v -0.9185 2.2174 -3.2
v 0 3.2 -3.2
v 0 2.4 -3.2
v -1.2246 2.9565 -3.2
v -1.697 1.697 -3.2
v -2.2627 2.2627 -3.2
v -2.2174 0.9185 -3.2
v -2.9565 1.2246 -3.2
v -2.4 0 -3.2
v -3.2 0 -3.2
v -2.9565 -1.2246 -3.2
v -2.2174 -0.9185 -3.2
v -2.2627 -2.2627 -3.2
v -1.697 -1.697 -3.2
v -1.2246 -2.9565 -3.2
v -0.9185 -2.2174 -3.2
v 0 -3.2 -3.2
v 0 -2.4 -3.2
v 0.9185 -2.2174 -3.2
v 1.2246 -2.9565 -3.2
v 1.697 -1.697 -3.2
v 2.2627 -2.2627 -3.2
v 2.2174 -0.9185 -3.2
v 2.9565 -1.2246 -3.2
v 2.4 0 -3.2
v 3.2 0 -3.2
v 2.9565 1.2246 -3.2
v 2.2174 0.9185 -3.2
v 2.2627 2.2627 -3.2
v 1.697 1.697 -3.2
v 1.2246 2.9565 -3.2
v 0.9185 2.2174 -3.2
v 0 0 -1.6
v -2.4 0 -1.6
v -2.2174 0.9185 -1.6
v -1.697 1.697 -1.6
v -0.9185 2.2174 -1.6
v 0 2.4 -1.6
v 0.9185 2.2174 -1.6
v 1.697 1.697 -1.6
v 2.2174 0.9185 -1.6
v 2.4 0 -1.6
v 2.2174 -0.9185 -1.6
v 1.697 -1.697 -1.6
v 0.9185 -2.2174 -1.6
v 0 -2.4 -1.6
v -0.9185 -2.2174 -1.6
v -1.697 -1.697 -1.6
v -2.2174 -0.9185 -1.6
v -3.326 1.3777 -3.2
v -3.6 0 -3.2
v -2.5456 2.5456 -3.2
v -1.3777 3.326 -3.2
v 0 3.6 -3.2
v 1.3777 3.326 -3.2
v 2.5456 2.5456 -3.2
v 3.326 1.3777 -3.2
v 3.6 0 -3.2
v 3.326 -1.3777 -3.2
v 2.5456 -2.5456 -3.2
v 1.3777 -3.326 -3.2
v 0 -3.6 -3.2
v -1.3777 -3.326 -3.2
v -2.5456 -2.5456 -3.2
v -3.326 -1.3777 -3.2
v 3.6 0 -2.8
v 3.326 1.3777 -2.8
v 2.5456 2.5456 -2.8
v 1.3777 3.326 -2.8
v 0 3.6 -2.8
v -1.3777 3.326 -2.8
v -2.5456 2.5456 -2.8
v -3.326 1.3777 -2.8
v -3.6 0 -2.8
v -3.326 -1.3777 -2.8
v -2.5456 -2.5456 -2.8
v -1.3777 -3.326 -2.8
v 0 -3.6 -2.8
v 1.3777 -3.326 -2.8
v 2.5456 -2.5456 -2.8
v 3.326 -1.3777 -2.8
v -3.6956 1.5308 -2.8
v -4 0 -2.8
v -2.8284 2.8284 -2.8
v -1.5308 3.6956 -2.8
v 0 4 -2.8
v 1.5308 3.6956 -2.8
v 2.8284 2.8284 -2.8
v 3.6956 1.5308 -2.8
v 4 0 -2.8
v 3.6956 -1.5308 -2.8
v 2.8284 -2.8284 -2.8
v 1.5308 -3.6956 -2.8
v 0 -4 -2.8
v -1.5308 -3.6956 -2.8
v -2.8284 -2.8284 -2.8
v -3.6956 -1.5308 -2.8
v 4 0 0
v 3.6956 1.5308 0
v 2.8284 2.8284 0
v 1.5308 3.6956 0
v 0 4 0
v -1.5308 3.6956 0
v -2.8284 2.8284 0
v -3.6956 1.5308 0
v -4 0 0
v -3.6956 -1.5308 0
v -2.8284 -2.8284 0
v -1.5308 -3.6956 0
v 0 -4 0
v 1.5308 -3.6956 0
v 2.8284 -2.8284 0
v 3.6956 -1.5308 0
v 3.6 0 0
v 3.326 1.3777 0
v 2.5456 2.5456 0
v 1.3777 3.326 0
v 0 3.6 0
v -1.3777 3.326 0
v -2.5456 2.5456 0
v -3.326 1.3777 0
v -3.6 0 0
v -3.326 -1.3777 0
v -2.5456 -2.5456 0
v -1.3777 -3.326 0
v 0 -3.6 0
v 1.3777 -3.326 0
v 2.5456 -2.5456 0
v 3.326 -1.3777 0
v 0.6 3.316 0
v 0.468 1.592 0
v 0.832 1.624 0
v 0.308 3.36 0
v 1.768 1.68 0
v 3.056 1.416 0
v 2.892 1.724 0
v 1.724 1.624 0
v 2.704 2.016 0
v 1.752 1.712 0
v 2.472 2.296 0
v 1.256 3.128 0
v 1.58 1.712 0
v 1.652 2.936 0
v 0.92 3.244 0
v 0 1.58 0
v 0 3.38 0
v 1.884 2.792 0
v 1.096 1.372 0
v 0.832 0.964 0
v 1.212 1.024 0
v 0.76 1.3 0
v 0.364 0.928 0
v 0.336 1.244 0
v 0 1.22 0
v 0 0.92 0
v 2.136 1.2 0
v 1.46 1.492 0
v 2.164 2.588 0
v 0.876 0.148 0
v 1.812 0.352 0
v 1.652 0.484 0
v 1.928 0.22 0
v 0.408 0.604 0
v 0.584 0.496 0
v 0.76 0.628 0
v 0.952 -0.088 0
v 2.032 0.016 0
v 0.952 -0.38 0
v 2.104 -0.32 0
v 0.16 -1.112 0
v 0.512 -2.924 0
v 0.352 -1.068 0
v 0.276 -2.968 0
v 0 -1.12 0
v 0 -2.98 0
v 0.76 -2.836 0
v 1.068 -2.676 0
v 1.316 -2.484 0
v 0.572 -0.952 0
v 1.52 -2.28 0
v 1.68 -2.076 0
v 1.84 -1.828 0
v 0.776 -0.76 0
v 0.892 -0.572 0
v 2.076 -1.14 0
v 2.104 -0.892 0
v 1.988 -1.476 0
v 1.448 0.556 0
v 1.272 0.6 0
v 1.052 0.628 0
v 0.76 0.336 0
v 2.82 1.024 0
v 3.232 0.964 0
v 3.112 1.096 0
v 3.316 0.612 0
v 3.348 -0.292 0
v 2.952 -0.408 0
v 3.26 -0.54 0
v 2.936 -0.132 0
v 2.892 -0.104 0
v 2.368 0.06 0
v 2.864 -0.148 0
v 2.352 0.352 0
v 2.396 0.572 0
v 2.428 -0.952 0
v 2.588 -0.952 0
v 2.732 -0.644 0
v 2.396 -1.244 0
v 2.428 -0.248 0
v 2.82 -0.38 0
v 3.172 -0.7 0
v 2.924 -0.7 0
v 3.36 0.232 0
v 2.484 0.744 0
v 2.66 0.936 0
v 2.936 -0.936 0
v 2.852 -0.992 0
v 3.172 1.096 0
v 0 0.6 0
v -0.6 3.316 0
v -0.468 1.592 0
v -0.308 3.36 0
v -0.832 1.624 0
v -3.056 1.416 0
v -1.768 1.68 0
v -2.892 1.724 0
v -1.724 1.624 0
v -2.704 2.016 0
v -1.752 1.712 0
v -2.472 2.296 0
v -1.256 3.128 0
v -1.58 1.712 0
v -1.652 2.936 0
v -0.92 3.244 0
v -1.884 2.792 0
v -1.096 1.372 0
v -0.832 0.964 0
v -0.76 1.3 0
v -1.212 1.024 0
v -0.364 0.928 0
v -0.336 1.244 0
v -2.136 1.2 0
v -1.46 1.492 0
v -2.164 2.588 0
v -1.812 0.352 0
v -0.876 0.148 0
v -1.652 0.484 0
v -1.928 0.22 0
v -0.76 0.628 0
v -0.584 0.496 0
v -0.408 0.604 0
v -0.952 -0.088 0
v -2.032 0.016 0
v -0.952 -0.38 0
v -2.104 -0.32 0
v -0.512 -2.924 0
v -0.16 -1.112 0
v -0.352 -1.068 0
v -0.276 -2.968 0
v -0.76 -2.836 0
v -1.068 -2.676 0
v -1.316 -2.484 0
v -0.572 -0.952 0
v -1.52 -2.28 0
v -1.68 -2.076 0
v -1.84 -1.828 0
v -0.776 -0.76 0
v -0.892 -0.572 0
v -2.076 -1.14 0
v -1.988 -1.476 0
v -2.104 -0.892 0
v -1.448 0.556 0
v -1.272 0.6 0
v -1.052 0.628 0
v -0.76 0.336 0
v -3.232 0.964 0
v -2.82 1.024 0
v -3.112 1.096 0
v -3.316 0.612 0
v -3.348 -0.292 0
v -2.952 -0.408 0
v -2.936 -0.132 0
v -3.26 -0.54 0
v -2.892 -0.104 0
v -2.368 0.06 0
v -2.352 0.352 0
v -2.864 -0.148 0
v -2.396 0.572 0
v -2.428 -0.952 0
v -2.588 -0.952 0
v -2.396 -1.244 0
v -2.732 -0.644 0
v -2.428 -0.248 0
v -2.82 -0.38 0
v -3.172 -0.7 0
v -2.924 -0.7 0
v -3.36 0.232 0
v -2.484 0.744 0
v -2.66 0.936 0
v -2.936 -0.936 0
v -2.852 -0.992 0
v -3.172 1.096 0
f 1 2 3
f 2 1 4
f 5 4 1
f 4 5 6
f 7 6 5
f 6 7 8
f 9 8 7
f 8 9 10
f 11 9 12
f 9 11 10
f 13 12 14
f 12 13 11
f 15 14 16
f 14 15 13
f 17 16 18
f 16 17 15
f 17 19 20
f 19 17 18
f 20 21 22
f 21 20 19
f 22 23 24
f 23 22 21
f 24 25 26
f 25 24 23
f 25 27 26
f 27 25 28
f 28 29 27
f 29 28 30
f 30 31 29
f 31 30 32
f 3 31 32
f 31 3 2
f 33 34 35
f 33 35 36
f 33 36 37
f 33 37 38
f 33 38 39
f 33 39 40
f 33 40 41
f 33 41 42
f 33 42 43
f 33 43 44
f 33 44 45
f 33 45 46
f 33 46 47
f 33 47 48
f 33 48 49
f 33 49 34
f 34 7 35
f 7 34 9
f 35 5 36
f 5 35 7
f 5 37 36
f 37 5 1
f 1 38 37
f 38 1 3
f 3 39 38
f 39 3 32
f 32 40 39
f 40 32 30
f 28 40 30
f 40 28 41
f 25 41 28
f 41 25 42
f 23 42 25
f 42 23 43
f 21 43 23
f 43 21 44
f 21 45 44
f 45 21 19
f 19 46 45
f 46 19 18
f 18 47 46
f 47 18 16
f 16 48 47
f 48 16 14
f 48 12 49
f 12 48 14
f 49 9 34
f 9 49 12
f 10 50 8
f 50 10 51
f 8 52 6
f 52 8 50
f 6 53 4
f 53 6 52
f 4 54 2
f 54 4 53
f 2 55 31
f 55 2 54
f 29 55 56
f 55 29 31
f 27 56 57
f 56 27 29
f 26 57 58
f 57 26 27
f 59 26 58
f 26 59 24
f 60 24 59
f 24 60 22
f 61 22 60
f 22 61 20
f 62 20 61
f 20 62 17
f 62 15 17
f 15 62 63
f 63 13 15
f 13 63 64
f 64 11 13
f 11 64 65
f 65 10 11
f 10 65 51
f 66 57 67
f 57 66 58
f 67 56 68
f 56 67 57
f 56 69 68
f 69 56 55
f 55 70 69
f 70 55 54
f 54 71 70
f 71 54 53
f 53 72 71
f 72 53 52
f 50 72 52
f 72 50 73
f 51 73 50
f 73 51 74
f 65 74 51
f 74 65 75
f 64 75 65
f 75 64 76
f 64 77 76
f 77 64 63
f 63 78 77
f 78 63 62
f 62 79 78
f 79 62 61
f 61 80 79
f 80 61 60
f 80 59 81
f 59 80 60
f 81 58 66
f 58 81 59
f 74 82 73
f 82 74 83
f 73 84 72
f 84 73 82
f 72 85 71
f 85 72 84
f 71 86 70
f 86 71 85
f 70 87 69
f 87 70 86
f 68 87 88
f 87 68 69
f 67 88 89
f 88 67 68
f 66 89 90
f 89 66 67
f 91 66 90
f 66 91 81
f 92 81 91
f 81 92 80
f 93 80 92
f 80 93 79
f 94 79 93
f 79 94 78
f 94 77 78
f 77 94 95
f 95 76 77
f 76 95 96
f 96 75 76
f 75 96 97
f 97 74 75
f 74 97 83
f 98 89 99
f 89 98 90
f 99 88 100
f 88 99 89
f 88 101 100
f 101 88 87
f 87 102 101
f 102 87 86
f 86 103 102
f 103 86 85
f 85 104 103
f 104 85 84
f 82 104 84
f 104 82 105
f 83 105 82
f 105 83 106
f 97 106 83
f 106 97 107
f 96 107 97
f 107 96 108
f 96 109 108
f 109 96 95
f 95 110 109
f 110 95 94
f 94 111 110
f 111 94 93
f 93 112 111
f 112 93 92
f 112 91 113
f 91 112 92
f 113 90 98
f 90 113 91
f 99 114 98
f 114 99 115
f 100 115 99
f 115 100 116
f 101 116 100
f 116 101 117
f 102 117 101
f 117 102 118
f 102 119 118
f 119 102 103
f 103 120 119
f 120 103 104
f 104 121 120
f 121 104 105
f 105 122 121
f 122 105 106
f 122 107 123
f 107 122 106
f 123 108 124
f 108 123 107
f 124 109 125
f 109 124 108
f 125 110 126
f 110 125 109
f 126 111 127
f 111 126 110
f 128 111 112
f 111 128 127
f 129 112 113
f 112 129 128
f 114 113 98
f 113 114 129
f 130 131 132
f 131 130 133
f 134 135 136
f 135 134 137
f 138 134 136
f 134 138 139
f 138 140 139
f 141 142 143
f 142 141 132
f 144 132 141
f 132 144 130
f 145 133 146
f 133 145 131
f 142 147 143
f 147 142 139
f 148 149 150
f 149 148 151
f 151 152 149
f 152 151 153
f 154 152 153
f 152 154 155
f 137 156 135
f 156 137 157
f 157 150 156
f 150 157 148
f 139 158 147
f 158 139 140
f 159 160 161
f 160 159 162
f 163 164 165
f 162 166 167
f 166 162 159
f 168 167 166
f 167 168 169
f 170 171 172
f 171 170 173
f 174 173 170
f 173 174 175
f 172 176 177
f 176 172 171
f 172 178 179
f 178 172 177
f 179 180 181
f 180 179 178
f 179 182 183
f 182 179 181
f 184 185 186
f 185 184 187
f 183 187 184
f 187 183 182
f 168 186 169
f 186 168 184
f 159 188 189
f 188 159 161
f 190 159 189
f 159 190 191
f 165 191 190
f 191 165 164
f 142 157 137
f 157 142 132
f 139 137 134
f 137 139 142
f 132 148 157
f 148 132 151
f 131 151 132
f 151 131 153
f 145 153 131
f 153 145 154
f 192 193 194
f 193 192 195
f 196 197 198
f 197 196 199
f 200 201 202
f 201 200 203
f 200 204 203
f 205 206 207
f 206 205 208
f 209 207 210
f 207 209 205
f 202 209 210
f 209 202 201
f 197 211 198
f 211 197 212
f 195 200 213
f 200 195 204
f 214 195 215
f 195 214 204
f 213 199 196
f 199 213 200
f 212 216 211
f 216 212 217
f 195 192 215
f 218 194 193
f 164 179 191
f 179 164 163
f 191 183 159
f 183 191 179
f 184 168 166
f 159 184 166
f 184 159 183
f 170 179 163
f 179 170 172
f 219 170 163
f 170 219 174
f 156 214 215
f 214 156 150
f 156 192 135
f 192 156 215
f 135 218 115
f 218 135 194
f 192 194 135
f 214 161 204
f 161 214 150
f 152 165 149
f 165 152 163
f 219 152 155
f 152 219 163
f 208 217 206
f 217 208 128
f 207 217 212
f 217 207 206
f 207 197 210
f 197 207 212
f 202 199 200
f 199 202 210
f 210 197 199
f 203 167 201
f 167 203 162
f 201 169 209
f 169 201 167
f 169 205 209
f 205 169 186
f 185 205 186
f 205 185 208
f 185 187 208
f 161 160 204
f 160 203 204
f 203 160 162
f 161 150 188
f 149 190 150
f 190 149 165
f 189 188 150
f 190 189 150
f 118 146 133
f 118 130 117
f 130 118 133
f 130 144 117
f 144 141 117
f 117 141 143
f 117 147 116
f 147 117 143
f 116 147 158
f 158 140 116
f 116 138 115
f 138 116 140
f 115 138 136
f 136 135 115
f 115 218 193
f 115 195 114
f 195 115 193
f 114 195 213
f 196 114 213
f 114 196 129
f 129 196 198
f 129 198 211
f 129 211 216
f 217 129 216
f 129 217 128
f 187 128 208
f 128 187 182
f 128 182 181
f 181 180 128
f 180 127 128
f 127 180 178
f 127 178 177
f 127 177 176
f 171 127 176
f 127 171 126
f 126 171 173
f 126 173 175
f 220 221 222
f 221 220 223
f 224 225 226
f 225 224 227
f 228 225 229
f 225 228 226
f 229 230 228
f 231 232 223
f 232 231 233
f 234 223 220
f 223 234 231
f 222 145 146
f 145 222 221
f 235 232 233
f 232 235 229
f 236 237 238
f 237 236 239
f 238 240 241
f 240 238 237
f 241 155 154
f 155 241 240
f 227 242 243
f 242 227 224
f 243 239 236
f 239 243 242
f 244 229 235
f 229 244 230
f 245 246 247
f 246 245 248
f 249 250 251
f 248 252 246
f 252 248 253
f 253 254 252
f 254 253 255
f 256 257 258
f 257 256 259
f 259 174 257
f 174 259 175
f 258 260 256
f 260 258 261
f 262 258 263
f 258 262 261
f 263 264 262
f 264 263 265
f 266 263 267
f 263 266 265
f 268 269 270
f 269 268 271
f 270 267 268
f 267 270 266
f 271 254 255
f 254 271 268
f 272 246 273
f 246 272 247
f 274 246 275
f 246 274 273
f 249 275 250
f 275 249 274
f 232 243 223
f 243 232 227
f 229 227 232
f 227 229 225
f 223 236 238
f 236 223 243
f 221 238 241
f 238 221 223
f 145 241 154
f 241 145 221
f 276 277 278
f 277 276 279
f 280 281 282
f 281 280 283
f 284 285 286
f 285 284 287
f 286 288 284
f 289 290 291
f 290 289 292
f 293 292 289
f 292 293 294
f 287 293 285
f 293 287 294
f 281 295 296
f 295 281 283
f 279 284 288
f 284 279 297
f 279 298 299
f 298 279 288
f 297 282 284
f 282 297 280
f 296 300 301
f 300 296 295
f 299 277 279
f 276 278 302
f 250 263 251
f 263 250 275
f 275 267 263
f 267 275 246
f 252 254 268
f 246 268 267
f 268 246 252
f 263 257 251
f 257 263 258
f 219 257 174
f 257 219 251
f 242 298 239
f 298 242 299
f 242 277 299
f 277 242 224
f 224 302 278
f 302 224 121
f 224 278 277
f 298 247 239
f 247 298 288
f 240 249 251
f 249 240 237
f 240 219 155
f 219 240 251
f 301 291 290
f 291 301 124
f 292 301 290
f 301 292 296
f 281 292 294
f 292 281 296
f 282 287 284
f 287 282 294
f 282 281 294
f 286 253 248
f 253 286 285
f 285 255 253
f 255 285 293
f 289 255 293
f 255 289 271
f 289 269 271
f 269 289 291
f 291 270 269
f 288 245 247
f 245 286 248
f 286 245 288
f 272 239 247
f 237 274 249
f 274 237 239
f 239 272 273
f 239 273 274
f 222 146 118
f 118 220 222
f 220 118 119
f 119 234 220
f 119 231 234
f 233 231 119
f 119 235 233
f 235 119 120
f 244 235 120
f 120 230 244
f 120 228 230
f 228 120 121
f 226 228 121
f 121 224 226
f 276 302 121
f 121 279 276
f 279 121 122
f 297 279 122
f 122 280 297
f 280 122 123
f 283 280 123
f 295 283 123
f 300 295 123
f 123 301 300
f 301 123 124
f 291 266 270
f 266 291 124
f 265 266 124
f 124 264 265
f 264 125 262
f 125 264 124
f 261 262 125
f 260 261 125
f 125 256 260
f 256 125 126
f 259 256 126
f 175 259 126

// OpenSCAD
// file: ../p/4-4disc.scad
use <../lib.scad>
function ldraw_lib__4_4disc() = [
// 0 Disc 1.0
// 0 Name: 4-4disc.dat
// 0 Author: James Jessiman
// 0 !LDRAW_ORG Primitive UPDATE 2002-02
// 0 !LICENSE Licensed under CC BY 4.0 : see CAreadme.txt
// 
// 0 BFC CERTIFY CCW
  [0,"BFC","CERTIFY"],
  [0,"BFC","CCW"],
// 
// 0 !HISTORY 1998-12-15 [PTadmin] Official Update 1998-10
// 0 !HISTORY 2002-03-23 [sbliss] Added BFC statement
// 0 !HISTORY 2002-04-25 [PTadmin] Official Update 2002-02
// 0 !HISTORY 2007-06-24 [PTadmin] Header formatted for Contributor Agreement
// 0 !HISTORY 2008-07-01 [PTadmin] Official Update 2008-01
// 
// 
// 3 16 0 0 0 1 0 0 0.9239 0 0.3827
  [3,16,0,0,0,1,0,0,0.9239,0,0.3827],
// 3 16 0 0 0 0.9239 0 0.3827 0.7071 0 0.7071
  [3,16,0,0,0,0.9239,0,0.3827,0.7071,0,0.7071],
// 3 16 0 0 0 0.7071 0 0.7071 0.3827 0 0.9239
  [3,16,0,0,0,0.7071,0,0.7071,0.3827,0,0.9239],
// 3 16 0 0 0 0.3827 0 0.9239 0 0 1
  [3,16,0,0,0,0.3827,0,0.9239,0,0,1],
// 3 16 0 0 0 0 0 1 -0.3827 0 0.9239
  [3,16,0,0,0,0,0,1,-0.3827,0,0.9239],
// 3 16 0 0 0 -0.3827 0 0.9239 -0.7071 0 0.7071
  [3,16,0,0,0,-0.3827,0,0.9239,-0.7071,0,0.7071],
// 3 16 0 0 0 -0.7071 0 0.7071 -0.9239 0 0.3827
  [3,16,0,0,0,-0.7071,0,0.7071,-0.9239,0,0.3827],
// 3 16 0 0 0 -0.9239 0 0.3827 -1 0 -0
  [3,16,0,0,0,-0.9239,0,0.3827,-1,0,-0],
// 3 16 0 0 0 -1 0 -0 -0.9239 0 -0.3827
  [3,16,0,0,0,-1,0,-0,-0.9239,0,-0.3827],
// 3 16 0 0 0 -0.9239 0 -0.3827 -0.7071 0 -0.7071
  [3,16,0,0,0,-0.9239,0,-0.3827,-0.7071,0,-0.7071],
// 3 16 0 0 0 -0.7071 0 -0.7071 -0.3827 0 -0.9239
  [3,16,0,0,0,-0.7071,0,-0.7071,-0.3827,0,-0.9239],
// 3 16 0 0 0 -0.3827 0 -0.9239 0 0 -1
  [3,16,0,0,0,-0.3827,0,-0.9239,0,0,-1],
// 3 16 0 0 0 0 0 -1 0.3827 0 -0.9239
  [3,16,0,0,0,0,0,-1,0.3827,0,-0.9239],
// 3 16 0 0 0 0.3827 0 -0.9239 0.7071 0 -0.7071
  [3,16,0,0,0,0.3827,0,-0.9239,0.7071,0,-0.7071],
// 3 16 0 0 0 0.7071 0 -0.7071 0.9239 0 -0.3827
  [3,16,0,0,0,0.7071,0,-0.7071,0.9239,0,-0.3827],
// 3 16 0 0 0 0.9239 0 -0.3827 1 0 0
  [3,16,0,0,0,0.9239,0,-0.3827,1,0,0],
// 0
];
module ldraw_lib__4_4disc(step=0, col=false, unit=2/5, alt=false, line=0.2, solid=!$preview)
    makepoly(ldraw_lib__4_4disc(), step=step, col=col, unit=unit, alt=alt, line=line, solid=solid);
ldraw_lib__4_4disc(line=0.2);
// file: ../p/4-4ring3.scad
use <../lib.scad>
function ldraw_lib__4_4ring3() = [
// 0 Ring  3 x 1.0
// 0 Name: 4-4ring3.dat
// 0 Author: James Jessiman
// 0 !LDRAW_ORG Primitive UPDATE 2009-01
// 0 !LICENSE Licensed under CC BY 4.0 : see CAreadme.txt
// 
// 0 BFC CERTIFY CCW
  [0,"BFC","CERTIFY"],
  [0,"BFC","CCW"],
// 
// 0 !HISTORY 1998-12-15 [PTadmin] Official Update 1998-10
// 0 !HISTORY 2002-04-05 [hafhead] Added BFC statement
// 0 !HISTORY 2002-04-25 [PTadmin] Official Update 2002-02
// 0 !HISTORY 2007-06-24 [PTadmin] Header formatted for Contributor Agreement
// 0 !HISTORY 2008-07-01 [PTadmin] Official Update 2008-01
// 0 !HISTORY 2008-08-26 [cwdee] Switch polygon winding and rename
// 0 !HISTORY 2009-05-02 [PTadmin] Official Update 2009-01
// 
// 
// 4 16 -1.5308 0 3.6956 -1.1481 0 2.7717 0 0 3 0 0 4
  [4,16,-1.5308,0,3.6956,-1.1481,0,2.7717,0,0,3,0,0,4],
// 4 16 -2.8284 0 2.8284 -2.1213 0 2.1213 -1.1481 0 2.7717 -1.5308 0 3.6956
  [4,16,-2.8284,0,2.8284,-2.1213,0,2.1213,-1.1481,0,2.7717,-1.5308,0,3.6956],
// 4 16 -3.6956 0 1.5308 -2.7717 0 1.1481 -2.1213 0 2.1213 -2.8284 0 2.8284
  [4,16,-3.6956,0,1.5308,-2.7717,0,1.1481,-2.1213,0,2.1213,-2.8284,0,2.8284],
// 4 16 -4 0 0 -3 0 0 -2.7717 0 1.1481 -3.6956 0 1.5308
  [4,16,-4,0,0,-3,0,0,-2.7717,0,1.1481,-3.6956,0,1.5308],
// 4 16 -3.6956 0 -1.5308 -2.7717 0 -1.1481 -3 0 0 -4 0 0
  [4,16,-3.6956,0,-1.5308,-2.7717,0,-1.1481,-3,0,0,-4,0,0],
// 4 16 -2.8284 0 -2.8284 -2.1213 0 -2.1213 -2.7717 0 -1.1481 -3.6956 0 -1.5308
  [4,16,-2.8284,0,-2.8284,-2.1213,0,-2.1213,-2.7717,0,-1.1481,-3.6956,0,-1.5308],
// 4 16 -1.5308 0 -3.6956 -1.1481 0 -2.7717 -2.1213 0 -2.1213 -2.8284 0 -2.8284
  [4,16,-1.5308,0,-3.6956,-1.1481,0,-2.7717,-2.1213,0,-2.1213,-2.8284,0,-2.8284],
// 4 16 0 0 -4 0 0 -3 -1.1481 0 -2.7717 -1.5308 0 -3.6956
  [4,16,0,0,-4,0,0,-3,-1.1481,0,-2.7717,-1.5308,0,-3.6956],
// 4 16 1.5308 0 -3.6956 1.1481 0 -2.7717 0 0 -3 0 0 -4
  [4,16,1.5308,0,-3.6956,1.1481,0,-2.7717,0,0,-3,0,0,-4],
// 4 16 2.8284 0 -2.8284 2.1213 0 -2.1213 1.1481 0 -2.7717 1.5308 0 -3.6956
  [4,16,2.8284,0,-2.8284,2.1213,0,-2.1213,1.1481,0,-2.7717,1.5308,0,-3.6956],
// 4 16 3.6956 0 -1.5308 2.7717 0 -1.1481 2.1213 0 -2.1213 2.8284 0 -2.8284
  [4,16,3.6956,0,-1.5308,2.7717,0,-1.1481,2.1213,0,-2.1213,2.8284,0,-2.8284],
// 4 16 4 0 0 3 0 0 2.7717 0 -1.1481 3.6956 0 -1.5308
  [4,16,4,0,0,3,0,0,2.7717,0,-1.1481,3.6956,0,-1.5308],
// 4 16 3.6956 0 1.5308 2.7717 0 1.1481 3 0 0 4 0 0
  [4,16,3.6956,0,1.5308,2.7717,0,1.1481,3,0,0,4,0,0],
// 4 16 2.8284 0 2.8284 2.1213 0 2.1213 2.7717 0 1.1481 3.6956 0 1.5308
  [4,16,2.8284,0,2.8284,2.1213,0,2.1213,2.7717,0,1.1481,3.6956,0,1.5308],
// 4 16 1.5308 0 3.6956 1.1481 0 2.7717 2.1213 0 2.1213 2.8284 0 2.8284
  [4,16,1.5308,0,3.6956,1.1481,0,2.7717,2.1213,0,2.1213,2.8284,0,2.8284],
// 4 16 0 0 4 0 0 3 1.1481 0 2.7717 1.5308 0 3.6956
  [4,16,0,0,4,0,0,3,1.1481,0,2.7717,1.5308,0,3.6956],
// 0
];
module ldraw_lib__4_4ring3(step=0, col=false, unit=2/5, alt=false, line=0.2, solid=!$preview)
    makepoly(ldraw_lib__4_4ring3(), step=step, col=col, unit=unit, alt=alt, line=line, solid=solid);
ldraw_lib__4_4ring3(line=0.2);
// file: ../p/4-4cylc.scad
use <../lib.scad>
use <4-4cyli.scad>
use <4-4disc.scad>
use <4-4edge.scad>
function ldraw_lib__4_4cylc() = [
// 0 Cylinder Closed 1.0
// 0 Name: 4-4cylc.dat
// 0 Author: Alex Taylor [anathema]
// 0 !LDRAW_ORG Primitive UPDATE 2009-02
// 0 !LICENSE Licensed under CC BY 4.0 : see CAreadme.txt
// 
// 0 BFC CERTIFY CCW
  [0,"BFC","CERTIFY"],
  [0,"BFC","CCW"],
// 
// 0 !HISTORY 2008-12-29 [cwdee] Removed one disc
// 0 !HISTORY 2009-09-03 [PTadmin] Official Update 2009-02
// 
// 
// 1 16 0 0 0 1 0 0 0 1 0 0 0 1 4-4edge.dat
  [1,16,0,0,0,1,0,0,0,1,0,0,0,1, ldraw_lib__4_4edge()],
// 1 16 0 1 0 1 0 0 0 1 0 0 0 1 4-4edge.dat
  [1,16,0,1,0,1,0,0,0,1,0,0,0,1, ldraw_lib__4_4edge()],
// 1 16 0 0 0 1 0 0 0 1 0 0 0 1 4-4disc.dat
  [1,16,0,0,0,1,0,0,0,1,0,0,0,1, ldraw_lib__4_4disc()],
// 1 16 0 0 0 1 0 0 0 1 0 0 0 1 4-4cyli.dat
  [1,16,0,0,0,1,0,0,0,1,0,0,0,1, ldraw_lib__4_4cyli()],
// 0
];
module ldraw_lib__4_4cylc(step=0, col=false, unit=2/5, alt=false, line=0.2, solid=!$preview)
    makepoly(ldraw_lib__4_4cylc(), step=step, col=col, unit=unit, alt=alt, line=line, solid=solid);
ldraw_lib__4_4cylc(line=0.2);
// file: ../p/4-4edge.scad
use <../lib.scad>
function ldraw_lib__4_4edge() = [
// 0 Circle 1.0
// 0 Name: 4-4edge.dat
// 0 Author: James Jessiman
// 0 !LDRAW_ORG Primitive UPDATE 2017-01
// 0 !LICENSE Licensed under CC BY 4.0 : see CAreadme.txt
// 
// 0 BFC CERTIFY CCW
  [0,"BFC","CERTIFY"],
  [0,"BFC","CCW"],
// 
// 0 !HISTORY 1998-12-15 [PTadmin] Official Update 1998-10
// 0 !HISTORY 2005-12-28 [PTadmin] Official Update 2005-01
// 0 !HISTORY 2007-06-24 [PTadmin] Header formatted for Contributor Agreement
// 0 !HISTORY 2008-07-01 [PTadmin] Official Update 2008-01
// 0 !HISTORY 2017-01-15 [Steffen] BFCed
// 0 !HISTORY 2017-12-30 [PTadmin] Official Update 2017-01
// 
// 
// 2 24 1 0 0 0.9239 0 0.3827
  [2,24,1,0,0,0.9239,0,0.3827],
// 2 24 0.9239 0 0.3827 0.7071 0 0.7071
  [2,24,0.9239,0,0.3827,0.7071,0,0.7071],
// 2 24 0.7071 0 0.7071 0.3827 0 0.9239
  [2,24,0.7071,0,0.7071,0.3827,0,0.9239],
// 2 24 0.3827 0 0.9239 0 0 1
  [2,24,0.3827,0,0.9239,0,0,1],
// 2 24 0 0 1 -0.3827 0 0.9239
  [2,24,0,0,1,-0.3827,0,0.9239],
// 2 24 -0.3827 0 0.9239 -0.7071 0 0.7071
  [2,24,-0.3827,0,0.9239,-0.7071,0,0.7071],
// 2 24 -0.7071 0 0.7071 -0.9239 0 0.3827
  [2,24,-0.7071,0,0.7071,-0.9239,0,0.3827],
// 2 24 -0.9239 0 0.3827 -1 0 -0
  [2,24,-0.9239,0,0.3827,-1,0,-0],
// 2 24 -1 0 -0 -0.9239 0 -0.3827
  [2,24,-1,0,-0,-0.9239,0,-0.3827],
// 2 24 -0.9239 0 -0.3827 -0.7071 0 -0.7071
  [2,24,-0.9239,0,-0.3827,-0.7071,0,-0.7071],
// 2 24 -0.7071 0 -0.7071 -0.3827 0 -0.9239
  [2,24,-0.7071,0,-0.7071,-0.3827,0,-0.9239],
// 2 24 -0.3827 0 -0.9239 0 0 -1
  [2,24,-0.3827,0,-0.9239,0,0,-1],
// 2 24 0 0 -1 0.3827 0 -0.9239
  [2,24,0,0,-1,0.3827,0,-0.9239],
// 2 24 0.3827 0 -0.9239 0.7071 0 -0.7071
  [2,24,0.3827,0,-0.9239,0.7071,0,-0.7071],
// 2 24 0.7071 0 -0.7071 0.9239 0 -0.3827
  [2,24,0.7071,0,-0.7071,0.9239,0,-0.3827],
// 2 24 0.9239 0 -0.3827 1 0 0
  [2,24,0.9239,0,-0.3827,1,0,0],
];
module ldraw_lib__4_4edge(step=0, col=false, unit=2/5, alt=false, line=0.2, solid=!$preview)
    makepoly(ldraw_lib__4_4edge(), step=step, col=col, unit=unit, alt=alt, line=line, solid=solid);
ldraw_lib__4_4edge(line=0.2);
// file: ../p/4-4cyli.scad
use <../lib.scad>
function ldraw_lib__4_4cyli() = [
// 0 Cylinder 1.0
// 0 Name: 4-4cyli.dat
// 0 Author: James Jessiman
// 0 !LDRAW_ORG Primitive UPDATE 2005-01
// 0 !LICENSE Licensed under CC BY 4.0 : see CAreadme.txt
// 
// 0 BFC CERTIFY CCW
  [0,"BFC","CERTIFY"],
  [0,"BFC","CCW"],
// 
// 0 !HISTORY 1998-12-15 [PTadmin] Official Update 1998-10
// 0 !HISTORY 2002-03-23 [sbliss] Added BFC statement; merged headers from files in distributions LDraw 0.27 and Complete.
// 0 !HISTORY 2002-04-25 [PTadmin] Official Update 2002-02
// 0 !HISTORY 2004-12-14 [guyvivan] BFC CCW
// 0 !HISTORY 2005-12-28 [PTadmin] Official Update 2005-01
// 0 !HISTORY 2007-06-24 [PTadmin] Header formatted for Contributor Agreement
// 0 !HISTORY 2008-07-01 [PTadmin] Official Update 2008-01
// 
// 
// 4 16 1 1 0 0.9239 1 0.3827 0.9239 0 0.3827 1 0 0
  [4,16,1,1,0,0.9239,1,0.3827,0.9239,0,0.3827,1,0,0],
// 5 24 1 0 0 1 1 0 0.9239 0 0.3827 0.9239 0 -0.3827
  [5,24,1,0,0,1,1,0,0.9239,0,0.3827,0.9239,0,-0.3827],
// 4 16 0.9239 1 0.3827 0.7071 1 0.7071 0.7071 0 0.7071 0.9239 0 0.3827
  [4,16,0.9239,1,0.3827,0.7071,1,0.7071,0.7071,0,0.7071,0.9239,0,0.3827],
// 5 24 0.9239 0 0.3827 0.9239 1 0.3827 0.7071 0 0.7071 1 0 0
  [5,24,0.9239,0,0.3827,0.9239,1,0.3827,0.7071,0,0.7071,1,0,0],
// 4 16 0.7071 1 0.7071 0.3827 1 0.9239 0.3827 0 0.9239 0.7071 0 0.7071
  [4,16,0.7071,1,0.7071,0.3827,1,0.9239,0.3827,0,0.9239,0.7071,0,0.7071],
// 5 24 0.7071 0 0.7071 0.7071 1 0.7071 0.3827 0 0.9239 0.9239 0 0.3827
  [5,24,0.7071,0,0.7071,0.7071,1,0.7071,0.3827,0,0.9239,0.9239,0,0.3827],
// 4 16 0.3827 1 0.9239 0 1 1 0 0 1 0.3827 0 0.9239
  [4,16,0.3827,1,0.9239,0,1,1,0,0,1,0.3827,0,0.9239],
// 5 24 0.3827 0 0.9239 0.3827 1 0.9239 0 0 1 0.7071 0 0.7071
  [5,24,0.3827,0,0.9239,0.3827,1,0.9239,0,0,1,0.7071,0,0.7071],
// 4 16 0 1 1 -0.3827 1 0.9239 -0.3827 0 0.9239 0 0 1
  [4,16,0,1,1,-0.3827,1,0.9239,-0.3827,0,0.9239,0,0,1],
// 5 24 0 0 1 0 1 1 -0.3827 0 0.9239 0.3827 0 0.9239
  [5,24,0,0,1,0,1,1,-0.3827,0,0.9239,0.3827,0,0.9239],
// 4 16 -0.3827 1 0.9239 -0.7071 1 0.7071 -0.7071 0 0.7071 -0.3827 0 0.9239
  [4,16,-0.3827,1,0.9239,-0.7071,1,0.7071,-0.7071,0,0.7071,-0.3827,0,0.9239],
// 5 24 -0.3827 0 0.9239 -0.3827 1 0.9239 -0.7071 0 0.7071 0 0 1
  [5,24,-0.3827,0,0.9239,-0.3827,1,0.9239,-0.7071,0,0.7071,0,0,1],
// 4 16 -0.7071 1 0.7071 -0.9239 1 0.3827 -0.9239 0 0.3827 -0.7071 0 0.7071
  [4,16,-0.7071,1,0.7071,-0.9239,1,0.3827,-0.9239,0,0.3827,-0.7071,0,0.7071],
// 5 24 -0.7071 0 0.7071 -0.7071 1 0.7071 -0.9239 0 0.3827 -0.3827 0 0.9239
  [5,24,-0.7071,0,0.7071,-0.7071,1,0.7071,-0.9239,0,0.3827,-0.3827,0,0.9239],
// 4 16 -0.9239 1 0.3827 -1 1 0 -1 0 0 -0.9239 0 0.3827
  [4,16,-0.9239,1,0.3827,-1,1,0,-1,0,0,-0.9239,0,0.3827],
// 5 24 -0.9239 0 0.3827 -0.9239 1 0.3827 -1 0 0 -0.7071 0 0.7071
  [5,24,-0.9239,0,0.3827,-0.9239,1,0.3827,-1,0,0,-0.7071,0,0.7071],
// 4 16 -1 1 0 -0.9239 1 -0.3827 -0.9239 0 -0.3827 -1 0 0
  [4,16,-1,1,0,-0.9239,1,-0.3827,-0.9239,0,-0.3827,-1,0,0],
// 5 24 -1 0 0 -1 1 0 -0.9239 0 -0.3827 -0.9239 0 0.3827
  [5,24,-1,0,0,-1,1,0,-0.9239,0,-0.3827,-0.9239,0,0.3827],
// 4 16 -0.9239 1 -0.3827 -0.7071 1 -0.7071 -0.7071 0 -0.7071 -0.9239 0 -0.3827
  [4,16,-0.9239,1,-0.3827,-0.7071,1,-0.7071,-0.7071,0,-0.7071,-0.9239,0,-0.3827],
// 5 24 -0.9239 0 -0.3827 -0.9239 1 -0.3827 -0.7071 0 -0.7071 -1 0 0
  [5,24,-0.9239,0,-0.3827,-0.9239,1,-0.3827,-0.7071,0,-0.7071,-1,0,0],
// 4 16 -0.7071 1 -0.7071 -0.3827 1 -0.9239 -0.3827 0 -0.9239 -0.7071 0 -0.7071
  [4,16,-0.7071,1,-0.7071,-0.3827,1,-0.9239,-0.3827,0,-0.9239,-0.7071,0,-0.7071],
// 5 24 -0.7071 0 -0.7071 -0.7071 1 -0.7071 -0.3827 0 -0.9239 -0.9239 0 -0.3827
  [5,24,-0.7071,0,-0.7071,-0.7071,1,-0.7071,-0.3827,0,-0.9239,-0.9239,0,-0.3827],
// 4 16 -0.3827 1 -0.9239 0 1 -1 0 0 -1 -0.3827 0 -0.9239
  [4,16,-0.3827,1,-0.9239,0,1,-1,0,0,-1,-0.3827,0,-0.9239],
// 5 24 -0.3827 0 -0.9239 -0.3827 1 -0.9239 0 0 -1 -0.7071 0 -0.7071
  [5,24,-0.3827,0,-0.9239,-0.3827,1,-0.9239,0,0,-1,-0.7071,0,-0.7071],
// 4 16 0 1 -1 0.3827 1 -0.9239 0.3827 0 -0.9239 0 0 -1
  [4,16,0,1,-1,0.3827,1,-0.9239,0.3827,0,-0.9239,0,0,-1],
// 5 24 0 0 -1 0 1 -1 0.3827 0 -0.9239 -0.3827 0 -0.9239
  [5,24,0,0,-1,0,1,-1,0.3827,0,-0.9239,-0.3827,0,-0.9239],
// 4 16 0.3827 1 -0.9239 0.7071 1 -0.7071 0.7071 0 -0.7071 0.3827 0 -0.9239
  [4,16,0.3827,1,-0.9239,0.7071,1,-0.7071,0.7071,0,-0.7071,0.3827,0,-0.9239],
// 5 24 0.3827 0 -0.9239 0.3827 1 -0.9239 0.7071 0 -0.7071 0 0 -1
  [5,24,0.3827,0,-0.9239,0.3827,1,-0.9239,0.7071,0,-0.7071,0,0,-1],
// 4 16 0.7071 1 -0.7071 0.9239 1 -0.3827 0.9239 0 -0.3827 0.7071 0 -0.7071
  [4,16,0.7071,1,-0.7071,0.9239,1,-0.3827,0.9239,0,-0.3827,0.7071,0,-0.7071],
// 5 24 0.7071 0 -0.7071 0.7071 1 -0.7071 0.9239 0 -0.3827 0.3827 0 -0.9239
  [5,24,0.7071,0,-0.7071,0.7071,1,-0.7071,0.9239,0,-0.3827,0.3827,0,-0.9239],
// 4 16 0.9239 1 -0.3827 1 1 0 1 0 0 0.9239 0 -0.3827
  [4,16,0.9239,1,-0.3827,1,1,0,1,0,0,0.9239,0,-0.3827],
// 5 24 0.9239 0 -0.3827 0.9239 1 -0.3827 1 0 0 0.7071 0 -0.7071
  [5,24,0.9239,0,-0.3827,0.9239,1,-0.3827,1,0,0,0.7071,0,-0.7071],
// 0
];
module ldraw_lib__4_4cyli(step=0, col=false, unit=2/5, alt=false, line=0.2, solid=!$preview)
    makepoly(ldraw_lib__4_4cyli(), step=step, col=col, unit=unit, alt=alt, line=line, solid=solid);
ldraw_lib__4_4cyli(line=0.2);
// file: ../p/stud4o.scad
use <../lib.scad>
use <4-4cylc.scad>
use <4-4ring3.scad>
function ldraw_lib__stud4o() = [
// 0 Stud Tube Open without Outer Cylinder
// 0 Name: stud4o.dat
// 0 Author: Magnus Forsberg [MagFors]
// 0 !LDRAW_ORG Primitive UPDATE 2011-02
// 0 !LICENSE Licensed under CC BY 4.0 : see CAreadme.txt
// 
// 0 !HELP This stud is a "antistud" to be used like a underside stud,
// 0 !HELP but without the outer cylinder.
// 0 !HELP 1 47 0 0 0 1 0 0 0 1 0 0 0 1 stud4.dat
// 
// 0 BFC CERTIFY CCW
  [0,"BFC","CERTIFY"],
  [0,"BFC","CCW"],
// 
// 0 !HISTORY 2011-12-29 [PTadmin] Official Update 2011-02
// 
// 
// 1 16 0 -4 0 2 0 0 0 1 0 0 0 2 4-4ring3.dat
  [1,16,0,-4,0,2,0,0,0,1,0,0,0,2, ldraw_lib__4_4ring3()],
// 0 BFC INVERTNEXT
  [0,"BFC","INVERTNEXT"],
// 1 16 0 0 0 -6 0 0 0 -4 0 0 0 6 4-4cylc.dat
  [1,16,0,0,0,-6,0,0,0,-4,0,0,0,6, ldraw_lib__4_4cylc()],
];
module ldraw_lib__stud4o(step=0, col=false, unit=2/5, alt=false, line=0.2, solid=!$preview)
    makepoly(ldraw_lib__stud4o(), step=step, col=col, unit=unit, alt=alt, line=line, solid=solid);
ldraw_lib__stud4o(line=0.2);
// file: ../p/4-4ring8.scad
use <../lib.scad>
function ldraw_lib__4_4ring8() = [
// 0 Ring  8 x 1.0
// 0 Name: 4-4ring8.dat
// 0 Author: Steffen [Steffen]
// 0 !LDRAW_ORG Primitive UPDATE 2012-01
// 0 !LICENSE Licensed under CC BY 4.0 : see CAreadme.txt
// 
// 0 BFC CERTIFY CCW
  [0,"BFC","CERTIFY"],
  [0,"BFC","CCW"],
// 
// 0 !HISTORY 2003-12-19 [PTadmin] Official Update 2003-03
// 0 !HISTORY 2007-06-24 [PTadmin] Header formatted for Contributor Agreement
// 0 !HISTORY 2008-07-01 [PTadmin] Official Update 2008-01
// 0 !HISTORY 2012-02-16 [Philo] Changed to CCW
// 0 !HISTORY 2012-03-30 [PTadmin] Official Update 2012-01
// 
// 
// 4 16 9 0 0 8.3151 0 3.4443 7.3912 0 3.0616 8 0 0
  [4,16,9,0,0,8.3151,0,3.4443,7.3912,0,3.0616,8,0,0],
// 4 16 8.3151 0 3.4443 6.3639 0 6.3639 5.6568 0 5.6568 7.3912 0 3.0616
  [4,16,8.3151,0,3.4443,6.3639,0,6.3639,5.6568,0,5.6568,7.3912,0,3.0616],
// 4 16 6.3639 0 6.3639 3.4443 0 8.3151 3.0616 0 7.3912 5.6568 0 5.6568
  [4,16,6.3639,0,6.3639,3.4443,0,8.3151,3.0616,0,7.3912,5.6568,0,5.6568],
// 4 16 3.4443 0 8.3151 0 0 9 0 0 8 3.0616 0 7.3912
  [4,16,3.4443,0,8.3151,0,0,9,0,0,8,3.0616,0,7.3912],
// 4 16 0 0 9 -3.4443 0 8.3151 -3.0616 0 7.3912 0 0 8
  [4,16,0,0,9,-3.4443,0,8.3151,-3.0616,0,7.3912,0,0,8],
// 4 16 -3.4443 0 8.3151 -6.3639 0 6.3639 -5.6568 0 5.6568 -3.0616 0 7.3912
  [4,16,-3.4443,0,8.3151,-6.3639,0,6.3639,-5.6568,0,5.6568,-3.0616,0,7.3912],
// 4 16 -6.3639 0 6.3639 -8.3151 0 3.4443 -7.3912 0 3.0616 -5.6568 0 5.6568
  [4,16,-6.3639,0,6.3639,-8.3151,0,3.4443,-7.3912,0,3.0616,-5.6568,0,5.6568],
// 4 16 -8.3151 0 3.4443 -9 0 0 -8 0 0 -7.3912 0 3.0616
  [4,16,-8.3151,0,3.4443,-9,0,0,-8,0,0,-7.3912,0,3.0616],
// 4 16 -9 0 0 -8.3151 0 -3.4443 -7.3912 0 -3.0616 -8 0 0
  [4,16,-9,0,0,-8.3151,0,-3.4443,-7.3912,0,-3.0616,-8,0,0],
// 4 16 -8.3151 0 -3.4443 -6.3639 0 -6.3639 -5.6568 0 -5.6568 -7.3912 0 -3.0616
  [4,16,-8.3151,0,-3.4443,-6.3639,0,-6.3639,-5.6568,0,-5.6568,-7.3912,0,-3.0616],
// 4 16 -6.3639 0 -6.3639 -3.4443 0 -8.3151 -3.0616 0 -7.3912 -5.6568 0 -5.6568
  [4,16,-6.3639,0,-6.3639,-3.4443,0,-8.3151,-3.0616,0,-7.3912,-5.6568,0,-5.6568],
// 4 16 -3.4443 0 -8.3151 0 0 -9 0 0 -8 -3.0616 0 -7.3912
  [4,16,-3.4443,0,-8.3151,0,0,-9,0,0,-8,-3.0616,0,-7.3912],
// 4 16 0 0 -9 3.4443 0 -8.3151 3.0616 0 -7.3912 0 0 -8
  [4,16,0,0,-9,3.4443,0,-8.3151,3.0616,0,-7.3912,0,0,-8],
// 4 16 3.4443 0 -8.3151 6.3639 0 -6.3639 5.6568 0 -5.6568 3.0616 0 -7.3912
  [4,16,3.4443,0,-8.3151,6.3639,0,-6.3639,5.6568,0,-5.6568,3.0616,0,-7.3912],
// 4 16 6.3639 0 -6.3639 8.3151 0 -3.4443 7.3912 0 -3.0616 5.6568 0 -5.6568
  [4,16,6.3639,0,-6.3639,8.3151,0,-3.4443,7.3912,0,-3.0616,5.6568,0,-5.6568],
// 4 16 8.3151 0 -3.4443 9 0 0 8 0 0 7.3912 0 -3.0616
  [4,16,8.3151,0,-3.4443,9,0,0,8,0,0,7.3912,0,-3.0616],
];
module ldraw_lib__4_4ring8(step=0, col=false, unit=2/5, alt=false, line=0.2, solid=!$preview)
    makepoly(ldraw_lib__4_4ring8(), step=step, col=col, unit=unit, alt=alt, line=line, solid=solid);
ldraw_lib__4_4ring8(line=0.2);
// file: ../p/4-4cylo.scad
use <../lib.scad>
use <4-4cyli.scad>
use <4-4edge.scad>
function ldraw_lib__4_4cylo() = [
// 0 Cylinder Open 1.0
// 0 Name: 4-4cylo.dat
// 0 Author: Mark Kennedy [mkennedy]
// 0 !LDRAW_ORG Primitive UPDATE 2010-01
// 0 !LICENSE Licensed under CC BY 4.0 : see CAreadme.txt
// 
// 0 BFC CERTIFY CCW
  [0,"BFC","CERTIFY"],
  [0,"BFC","CCW"],
// 
// 0 !HISTORY 2010-04-05 [PTadmin] Official Update 2010-01
// 
// 
// 1 16 0 0 0 1 0 0 0 1 0 0 0 1 4-4edge.dat
  [1,16,0,0,0,1,0,0,0,1,0,0,0,1, ldraw_lib__4_4edge()],
// 1 16 0 1 0 1 0 0 0 1 0 0 0 1 4-4edge.dat
  [1,16,0,1,0,1,0,0,0,1,0,0,0,1, ldraw_lib__4_4edge()],
// 1 16 0 0 0 1 0 0 0 1 0 0 0 1 4-4cyli.dat
  [1,16,0,0,0,1,0,0,0,1,0,0,0,1, ldraw_lib__4_4cyli()],
// 0
];
module ldraw_lib__4_4cylo(step=0, col=false, unit=2/5, alt=false, line=0.2, solid=!$preview)
    makepoly(ldraw_lib__4_4cylo(), step=step, col=col, unit=unit, alt=alt, line=line, solid=solid);
ldraw_lib__4_4cylo(line=0.2);
// file: ../p/empty.scad
use <../lib.scad>
function ldraw_lib__empty() = [
// 0 Empty
// 0 Name: empty.dat
// 0 Author: Steffen [Steffen]
// 0 !LDRAW_ORG Primitive UPDATE 2015-01
// 0 !LICENSE Licensed under CC BY 4.0 : see CAreadme.txt
// 
// 0 BFC CERTIFY CCW
  [0,"BFC","CERTIFY"],
  [0,"BFC","CCW"],
// 
// 0 !HISTORY 2015-10-11 [PTadmin] Official Update 2015-01
// 
// 
// 0 // Tool MLCad cannot handle really empty files. This file is used as a workaround.
// 0 // It exceptionally contains forbidden non-LDRAW standard syntax to satisfy MLCad until it is fixed OR a different editor has become the de-facto LDRAW standard.
// 0 // The line being used here is an "impossible" conditional line which never should be visible,
// 0 // additionally hidden by a syntax explicitly hiding it from displaying.
// 
// 0 MLCAD HIDE 5 24 0 0 0 0.0001 0 0 0.0001 -0.0001 0 0 0 0
];
module ldraw_lib__empty(step=0, col=false, unit=2/5, alt=false, line=0.2, solid=!$preview)
    makepoly(ldraw_lib__empty(), step=step, col=col, unit=unit, alt=alt, line=line, solid=solid);
ldraw_lib__empty(line=0.2);
// file: s/98138s02.scad
use <../../lib.scad>
use <../../p/4-4cylo.scad>
use <../../p/4-4ring8.scad>
use <../../p/4-4ring9.scad>
use <../../p/stud4o.scad>
function ldraw_lib__s__98138s02() = [
// 0 ~Tile  1 x  1 Round with Groove without Complete Top Face
// 0 Name: s\98138s02.dat
// 0 Author: Magnus Forsberg [MagFors]
// 0 !LDRAW_ORG Subpart UPDATE 2020-01
// 0 !LICENSE Licensed under CC BY 4.0 : see CAreadme.txt
// 
// 0 BFC CERTIFY CCW
  [0,"BFC","CERTIFY"],
  [0,"BFC","CCW"],
// 
// 0 !HISTORY 2020-06-28 [PTadmin] Official Update 2020-01
// 
// 
// 1 16 0 4 0 1 0 0 0 -1 0 0 0 1 stud4o.dat
  [1,16,0,4,0,1,0,0,0,-1,0,0,0,1, ldraw_lib__stud4o()],
// 1 16 0 8 0 -1 0 0 0 -1 0 0 0 1 4-4ring8.dat
  [1,16,0,8,0,-1,0,0,0,-1,0,0,0,1, ldraw_lib__4_4ring8()],
// 1 16 0 7 0 9 0 0 0 1 0 0 0 9 4-4cylo.dat
  [1,16,0,7,0,9,0,0,0,1,0,0,0,9, ldraw_lib__4_4cylo()],
// 1 16 0 7 0 -1 0 0 0 -1 0 0 0 1 4-4ring9.dat
  [1,16,0,7,0,-1,0,0,0,-1,0,0,0,1, ldraw_lib__4_4ring9()],
// 1 16 0 0 0 10 0 0 0 7 0 0 0 10 4-4cylo.dat
  [1,16,0,0,0,10,0,0,0,7,0,0,0,10, ldraw_lib__4_4cylo()],
];
module ldraw_lib__s__98138s02(step=0, col=false, unit=2/5, alt=false, line=0.2, solid=!$preview)
    makepoly(ldraw_lib__s__98138s02(), step=step, col=col, unit=unit, alt=alt, line=line, solid=solid);
ldraw_lib__s__98138s02(line=0.2);
// file: ../p/4-4ring9.scad
use <../lib.scad>
function ldraw_lib__4_4ring9() = [
// 0 Ring  9 x 1.0
// 0 Name: 4-4ring9.dat
// 0 Author: Magnus Forsberg [MagFors]
// 0 !LDRAW_ORG Primitive UPDATE 2024-01
// 0 !LICENSE Licensed under CC BY 4.0 : see CAreadme.txt
// 
// 0 BFC CERTIFY CCW
  [0,"BFC","CERTIFY"],
  [0,"BFC","CCW"],
// 
// 0 !HISTORY 2004-04-22 [PTadmin] Official Update 2004-02
// 0 !HISTORY 2007-06-24 [PTadmin] Header formatted for Contributor Agreement
// 0 !HISTORY 2008-07-01 [PTadmin] Official Update 2008-01
// 0 !HISTORY 2024-01-04 [MagFors] Complete regeneration, original by jriley
// 0 !HISTORY 2024-01-29 [OrionP] Official Update 2024-01
// 
// 4 16 10 0 0 9.239 0 3.827 8.3151 0 3.4443 9 0 0
  [4,16,10,0,0,9.239,0,3.827,8.3151,0,3.4443,9,0,0],
// 4 16 9.239 0 3.827 7.071 0 7.071 6.3639 0 6.3639 8.3151 0 3.4443
  [4,16,9.239,0,3.827,7.071,0,7.071,6.3639,0,6.3639,8.3151,0,3.4443],
// 4 16 7.071 0 7.071 3.827 0 9.239 3.4443 0 8.3151 6.3639 0 6.3639
  [4,16,7.071,0,7.071,3.827,0,9.239,3.4443,0,8.3151,6.3639,0,6.3639],
// 4 16 3.827 0 9.239 0 0 10 0 0 9 3.4443 0 8.3151
  [4,16,3.827,0,9.239,0,0,10,0,0,9,3.4443,0,8.3151],
// 4 16 0 0 10 -3.827 0 9.239 -3.4443 0 8.3151 0 0 9
  [4,16,0,0,10,-3.827,0,9.239,-3.4443,0,8.3151,0,0,9],
// 4 16 -3.827 0 9.239 -7.071 0 7.071 -6.3639 0 6.3639 -3.4443 0 8.3151
  [4,16,-3.827,0,9.239,-7.071,0,7.071,-6.3639,0,6.3639,-3.4443,0,8.3151],
// 4 16 -7.071 0 7.071 -9.239 0 3.827 -8.3151 0 3.4443 -6.3639 0 6.3639
  [4,16,-7.071,0,7.071,-9.239,0,3.827,-8.3151,0,3.4443,-6.3639,0,6.3639],
// 4 16 -9.239 0 3.827 -10 0 0 -9 0 0 -8.3151 0 3.4443
  [4,16,-9.239,0,3.827,-10,0,0,-9,0,0,-8.3151,0,3.4443],
// 4 16 -10 0 0 -9.239 0 -3.827 -8.3151 0 -3.4443 -9 0 0
  [4,16,-10,0,0,-9.239,0,-3.827,-8.3151,0,-3.4443,-9,0,0],
// 4 16 -9.239 0 -3.827 -7.071 0 -7.071 -6.3639 0 -6.3639 -8.3151 0 -3.4443
  [4,16,-9.239,0,-3.827,-7.071,0,-7.071,-6.3639,0,-6.3639,-8.3151,0,-3.4443],
// 4 16 -7.071 0 -7.071 -3.827 0 -9.239 -3.4443 0 -8.3151 -6.3639 0 -6.3639
  [4,16,-7.071,0,-7.071,-3.827,0,-9.239,-3.4443,0,-8.3151,-6.3639,0,-6.3639],
// 4 16 -3.827 0 -9.239 0 0 -10 0 0 -9 -3.4443 0 -8.3151
  [4,16,-3.827,0,-9.239,0,0,-10,0,0,-9,-3.4443,0,-8.3151],
// 4 16 0 0 -10 3.827 0 -9.239 3.4443 0 -8.3151 0 0 -9
  [4,16,0,0,-10,3.827,0,-9.239,3.4443,0,-8.3151,0,0,-9],
// 4 16 3.827 0 -9.239 7.071 0 -7.071 6.3639 0 -6.3639 3.4443 0 -8.3151
  [4,16,3.827,0,-9.239,7.071,0,-7.071,6.3639,0,-6.3639,3.4443,0,-8.3151],
// 4 16 7.071 0 -7.071 9.239 0 -3.827 8.3151 0 -3.4443 6.3639 0 -6.3639
  [4,16,7.071,0,-7.071,9.239,0,-3.827,8.3151,0,-3.4443,6.3639,0,-6.3639],
// 4 16 9.239 0 -3.827 10 0 0 9 0 0 8.3151 0 -3.4443
  [4,16,9.239,0,-3.827,10,0,0,9,0,0,8.3151,0,-3.4443],
// 0 // Build by LDPartEditor (PrimGen 2.X)
];
module ldraw_lib__4_4ring9(step=0, col=false, unit=2/5, alt=false, line=0.2, solid=!$preview)
    makepoly(ldraw_lib__4_4ring9(), step=step, col=col, unit=unit, alt=alt, line=line, solid=solid);
ldraw_lib__4_4ring9(line=0.2);
// file: ../p/1-16chrd.scad
use <../lib.scad>
use <empty.scad>
function ldraw_lib__1_16chrd() = [
// 0 Chord 0.0625
// 0 Name: 1-16chrd.dat
// 0 Author: Philippe Hurbain [Philo]
// 0 !LDRAW_ORG Primitive UPDATE 2015-01
// 0 !LICENSE Licensed under CC BY 4.0 : see CAreadme.txt
// 
// 0 BFC CERTIFY CCW
  [0,"BFC","CERTIFY"],
  [0,"BFC","CCW"],
// 
// 0 !HISTORY 2015-10-11 [PTadmin] Official Update 2015-01
// 
// 
// 0 // This file is intentionally empty because at the current \P resolution,
// 0 // an 1-16chrd is actually empty. However, this file still is present
// 0 // to allow tools to do primitives substition and fill in a real chrd here,
// 0 // or, if desired, to substitute this with the hi-res 48\1-16chrd.
// 
// 0 // This file is based on an idea by Darats at http://forums.ldraw.org/read.php?19,14500,14500#msg-14500
// 
// 1 16 0 0 0 1 0 0 0 1 0 0 0 1 empty.dat
  [1,16,0,0,0,1,0,0,0,1,0,0,0,1, ldraw_lib__empty()],
];
module ldraw_lib__1_16chrd(step=0, col=false, unit=2/5, alt=false, line=0.2, solid=!$preview)
    makepoly(ldraw_lib__1_16chrd(), step=step, col=col, unit=unit, alt=alt, line=line, solid=solid);
ldraw_lib__1_16chrd(line=0.2);
// file: s/98138s01.scad
use <../../lib.scad>
use <../../p/4-4ring9.scad>
use <98138s02.scad>
function ldraw_lib__s__98138s01() = [
// 0 ~Tile  1 x  1 Round with Groove with Partial Top Face
// 0 Name: s\98138s01.dat
// 0 Author: Magnus Forsberg [MagFors]
// 0 !LDRAW_ORG Subpart UPDATE 2020-01
// 0 !LICENSE Licensed under CC BY 4.0 : see CAreadme.txt
// 
// 0 BFC CERTIFY CCW
  [0,"BFC","CERTIFY"],
  [0,"BFC","CCW"],
// 
// 0 !HISTORY 2011-12-29 [PTadmin] Official Update 2011-02
// 0 !HISTORY 2016-06-17 [MagFors] Reduced the rounded edge to 0.5 ldu
// 0 !HISTORY 2016-12-31 [PTadmin] Official Update 2016-01
// 0 !HISTORY 2019-06-17 [MagFors] Removed the rounded edge
// 0 !HISTORY 2019-07-19 [MagFors] Subfiled without top surface
// 0 !HISTORY 2020-06-28 [PTadmin] Official Update 2020-01
// 
// 
// 1 16 0 0 0 1 0 0 0 1 0 0 0 1 s\98138s02.dat
  [1,16,0,0,0,1,0,0,0,1,0,0,0,1, ldraw_lib__s__98138s02()],
// 1 16 0 0 0 1 0 0 0 1 0 0 0 1 4-4ring9.dat
  [1,16,0,0,0,1,0,0,0,1,0,0,0,1, ldraw_lib__4_4ring9()],
];
module ldraw_lib__s__98138s01(step=0, col=false, unit=2/5, alt=false, line=0.2, solid=!$preview)
    makepoly(ldraw_lib__s__98138s01(), step=step, col=col, unit=unit, alt=alt, line=line, solid=solid);
ldraw_lib__s__98138s01(line=0.2);
// file: ../p/4-4ering.scad
use <../lib.scad>
use <1-16chrd.scad>
function ldraw_lib__4_4ering() = [
// 0 Adapter Ring Triangles to Normal 1.0
// 0 Name: 4-4ering.dat
// 0 Author: Philippe Hurbain [Philo]
// 0 !LDRAW_ORG Primitive UPDATE 2015-01
// 0 !LICENSE Licensed under CC BY 4.0 : see CAreadme.txt
// 
// 0 BFC CERTIFY CCW
  [0,"BFC","CERTIFY"],
  [0,"BFC","CCW"],
// 
// 0 !HISTORY 2015-10-11 [PTadmin] Official Update 2015-01
// 
// 
// 0 // This file uses 1-16chrd (actually empty). It allows
// 0 // tools to do primitives substition and fill in a ring of chrd here,
// 0 // or, if desired, to substitute this with the hi-res 48\1-16chrd.
// 0 // This file is based on an idea by Darats at http://forums.ldraw.org/read.php?19,14500,14500#msg-14500
// 
// 1 16 0 0 0 1 0 0 0 1 0 0 0 1 1-16chrd.dat
  [1,16,0,0,0,1,0,0,0,1,0,0,0,1, ldraw_lib__1_16chrd()],
// 1 16 0 0 0 0.92388 0 0.38268 0 1 0 -0.38268 0 0.92388 1-16chrd.dat
  [1,16,0,0,0,0.92388,0,0.38268,0,1,0,-0.38268,0,0.92388, ldraw_lib__1_16chrd()],
// 1 16 0 0 0 0.70711 0 0.70711 0 1 0 -0.70711 0 0.70711 1-16chrd.dat
  [1,16,0,0,0,0.70711,0,0.70711,0,1,0,-0.70711,0,0.70711, ldraw_lib__1_16chrd()],
// 1 16 0 0 0 0.38268 0 0.92388 0 1 0 -0.92388 0 0.38268 1-16chrd.dat
  [1,16,0,0,0,0.38268,0,0.92388,0,1,0,-0.92388,0,0.38268, ldraw_lib__1_16chrd()],
// 1 16 0 0 0 0 0 1 0 1 0 -1 0 0 1-16chrd.dat
  [1,16,0,0,0,0,0,1,0,1,0,-1,0,0, ldraw_lib__1_16chrd()],
// 1 16 0 0 0 -0.38268 0 0.92388 0 1 0 -0.92388 0 -0.38268 1-16chrd.dat
  [1,16,0,0,0,-0.38268,0,0.92388,0,1,0,-0.92388,0,-0.38268, ldraw_lib__1_16chrd()],
// 1 16 0 0 0 -0.70711 0 0.70711 0 1 0 -0.70711 0 -0.70711 1-16chrd.dat
  [1,16,0,0,0,-0.70711,0,0.70711,0,1,0,-0.70711,0,-0.70711, ldraw_lib__1_16chrd()],
// 1 16 0 0 0 -0.92388 0 0.38268 0 1 0 -0.38268 0 -0.92388 1-16chrd.dat
  [1,16,0,0,0,-0.92388,0,0.38268,0,1,0,-0.38268,0,-0.92388, ldraw_lib__1_16chrd()],
// 1 16 0 0 0 0 0 -1 0 1 0 1 0 0 1-16chrd.dat
  [1,16,0,0,0,0,0,-1,0,1,0,1,0,0, ldraw_lib__1_16chrd()],
// 1 16 0 0 0 0.38268 0 -0.92388 0 1 0 0.92388 0 0.38268 1-16chrd.dat
  [1,16,0,0,0,0.38268,0,-0.92388,0,1,0,0.92388,0,0.38268, ldraw_lib__1_16chrd()],
// 1 16 0 0 0 0.70711 0 -0.70711 0 1 0 0.70711 0 0.70711 1-16chrd.dat
  [1,16,0,0,0,0.70711,0,-0.70711,0,1,0,0.70711,0,0.70711, ldraw_lib__1_16chrd()],
// 1 16 0 0 0 0.92388 0 -0.38268 0 1 0 0.38268 0 0.92388 1-16chrd.dat
  [1,16,0,0,0,0.92388,0,-0.38268,0,1,0,0.38268,0,0.92388, ldraw_lib__1_16chrd()],
// 1 16 0 0 0 -1 0 0 0 1 0 0 0 -1 1-16chrd.dat
  [1,16,0,0,0,-1,0,0,0,1,0,0,0,-1, ldraw_lib__1_16chrd()],
// 1 16 0 0 0 -0.92388 0 -0.38268 0 1 0 0.38268 0 -0.92388 1-16chrd.dat
  [1,16,0,0,0,-0.92388,0,-0.38268,0,1,0,0.38268,0,-0.92388, ldraw_lib__1_16chrd()],
// 1 16 0 0 0 -0.70711 0 -0.70711 0 1 0 0.70711 0 -0.70711 1-16chrd.dat
  [1,16,0,0,0,-0.70711,0,-0.70711,0,1,0,0.70711,0,-0.70711, ldraw_lib__1_16chrd()],
// 1 16 0 0 0 -0.38268 0 -0.92388 0 1 0 0.92388 0 -0.38268 1-16chrd.dat
  [1,16,0,0,0,-0.38268,0,-0.92388,0,1,0,0.92388,0,-0.38268, ldraw_lib__1_16chrd()],
];
module ldraw_lib__4_4ering(step=0, col=false, unit=2/5, alt=false, line=0.2, solid=!$preview)
    makepoly(ldraw_lib__4_4ering(), step=step, col=col, unit=unit, alt=alt, line=line, solid=solid);
ldraw_lib__4_4ering(line=0.2);
// main file
use <../lib.scad>
use <../p/4-4ering.scad>
use <s/98138p31s01.scad>
use <s/98138s01.scad>
function ldraw_lib__98138p31() = [
// 0 Tile  1 x  1 Round with Magenta Eye, Metallic Silver Pupil, Dark Turquoise Eyelid and Medium Lilac Fur Pattern
// 0 Name: 98138p31.dat
// 0 Author: Vincent Messenet [Cheenzo]
// 0 !LDRAW_ORG Part UPDATE 2024-06
// 0 !LICENSE Licensed under CC BY 4.0 : see CAreadme.txt
// 
// 0 BFC CERTIFY CCW
  [0,"BFC","CERTIFY"],
  [0,"BFC","CCW"],
// 
// 0 !KEYWORDS Bricklink 98138pb382, Rebrickable 98138pr0363, Set 80048
// 
// 0 !HISTORY 2024-07-29 [OrionP] Official Update 2024-06
// 
// 1 16 0 0 0 1 0 0 0 1 0 0 0 1 s\98138s01.dat
  [1,16,0,0,0,1,0,0,0,1,0,0,0,1, ldraw_lib__s__98138s01()],
// 1 16 0 0 0 9 0 0 0 9 0 0 0 9 4-4ering.dat
  [1,16,0,0,0,9,0,0,0,9,0,0,0,9, ldraw_lib__4_4ering()],
// 1 16 0 0 0 1 0 0 0 1 0 0 0 1 s\98138p31s01.dat
  [1,16,0,0,0,1,0,0,0,1,0,0,0,1, ldraw_lib__s__98138p31s01()],
// 1 16 0 0 0 -1 0 0 0 1 0 0 0 1 s\98138p31s01.dat
  [1,16,0,0,0,-1,0,0,0,1,0,0,0,1, ldraw_lib__s__98138p31s01()],
];
module ldraw_lib__98138p31(step=0, col=false, unit=2/5, alt=false, line=0.2, solid=!$preview)
    makepoly(ldraw_lib__98138p31(), step=step, col=col, unit=unit, alt=alt, line=line, solid=solid);
ldraw_lib__98138p31(line=0.2);
